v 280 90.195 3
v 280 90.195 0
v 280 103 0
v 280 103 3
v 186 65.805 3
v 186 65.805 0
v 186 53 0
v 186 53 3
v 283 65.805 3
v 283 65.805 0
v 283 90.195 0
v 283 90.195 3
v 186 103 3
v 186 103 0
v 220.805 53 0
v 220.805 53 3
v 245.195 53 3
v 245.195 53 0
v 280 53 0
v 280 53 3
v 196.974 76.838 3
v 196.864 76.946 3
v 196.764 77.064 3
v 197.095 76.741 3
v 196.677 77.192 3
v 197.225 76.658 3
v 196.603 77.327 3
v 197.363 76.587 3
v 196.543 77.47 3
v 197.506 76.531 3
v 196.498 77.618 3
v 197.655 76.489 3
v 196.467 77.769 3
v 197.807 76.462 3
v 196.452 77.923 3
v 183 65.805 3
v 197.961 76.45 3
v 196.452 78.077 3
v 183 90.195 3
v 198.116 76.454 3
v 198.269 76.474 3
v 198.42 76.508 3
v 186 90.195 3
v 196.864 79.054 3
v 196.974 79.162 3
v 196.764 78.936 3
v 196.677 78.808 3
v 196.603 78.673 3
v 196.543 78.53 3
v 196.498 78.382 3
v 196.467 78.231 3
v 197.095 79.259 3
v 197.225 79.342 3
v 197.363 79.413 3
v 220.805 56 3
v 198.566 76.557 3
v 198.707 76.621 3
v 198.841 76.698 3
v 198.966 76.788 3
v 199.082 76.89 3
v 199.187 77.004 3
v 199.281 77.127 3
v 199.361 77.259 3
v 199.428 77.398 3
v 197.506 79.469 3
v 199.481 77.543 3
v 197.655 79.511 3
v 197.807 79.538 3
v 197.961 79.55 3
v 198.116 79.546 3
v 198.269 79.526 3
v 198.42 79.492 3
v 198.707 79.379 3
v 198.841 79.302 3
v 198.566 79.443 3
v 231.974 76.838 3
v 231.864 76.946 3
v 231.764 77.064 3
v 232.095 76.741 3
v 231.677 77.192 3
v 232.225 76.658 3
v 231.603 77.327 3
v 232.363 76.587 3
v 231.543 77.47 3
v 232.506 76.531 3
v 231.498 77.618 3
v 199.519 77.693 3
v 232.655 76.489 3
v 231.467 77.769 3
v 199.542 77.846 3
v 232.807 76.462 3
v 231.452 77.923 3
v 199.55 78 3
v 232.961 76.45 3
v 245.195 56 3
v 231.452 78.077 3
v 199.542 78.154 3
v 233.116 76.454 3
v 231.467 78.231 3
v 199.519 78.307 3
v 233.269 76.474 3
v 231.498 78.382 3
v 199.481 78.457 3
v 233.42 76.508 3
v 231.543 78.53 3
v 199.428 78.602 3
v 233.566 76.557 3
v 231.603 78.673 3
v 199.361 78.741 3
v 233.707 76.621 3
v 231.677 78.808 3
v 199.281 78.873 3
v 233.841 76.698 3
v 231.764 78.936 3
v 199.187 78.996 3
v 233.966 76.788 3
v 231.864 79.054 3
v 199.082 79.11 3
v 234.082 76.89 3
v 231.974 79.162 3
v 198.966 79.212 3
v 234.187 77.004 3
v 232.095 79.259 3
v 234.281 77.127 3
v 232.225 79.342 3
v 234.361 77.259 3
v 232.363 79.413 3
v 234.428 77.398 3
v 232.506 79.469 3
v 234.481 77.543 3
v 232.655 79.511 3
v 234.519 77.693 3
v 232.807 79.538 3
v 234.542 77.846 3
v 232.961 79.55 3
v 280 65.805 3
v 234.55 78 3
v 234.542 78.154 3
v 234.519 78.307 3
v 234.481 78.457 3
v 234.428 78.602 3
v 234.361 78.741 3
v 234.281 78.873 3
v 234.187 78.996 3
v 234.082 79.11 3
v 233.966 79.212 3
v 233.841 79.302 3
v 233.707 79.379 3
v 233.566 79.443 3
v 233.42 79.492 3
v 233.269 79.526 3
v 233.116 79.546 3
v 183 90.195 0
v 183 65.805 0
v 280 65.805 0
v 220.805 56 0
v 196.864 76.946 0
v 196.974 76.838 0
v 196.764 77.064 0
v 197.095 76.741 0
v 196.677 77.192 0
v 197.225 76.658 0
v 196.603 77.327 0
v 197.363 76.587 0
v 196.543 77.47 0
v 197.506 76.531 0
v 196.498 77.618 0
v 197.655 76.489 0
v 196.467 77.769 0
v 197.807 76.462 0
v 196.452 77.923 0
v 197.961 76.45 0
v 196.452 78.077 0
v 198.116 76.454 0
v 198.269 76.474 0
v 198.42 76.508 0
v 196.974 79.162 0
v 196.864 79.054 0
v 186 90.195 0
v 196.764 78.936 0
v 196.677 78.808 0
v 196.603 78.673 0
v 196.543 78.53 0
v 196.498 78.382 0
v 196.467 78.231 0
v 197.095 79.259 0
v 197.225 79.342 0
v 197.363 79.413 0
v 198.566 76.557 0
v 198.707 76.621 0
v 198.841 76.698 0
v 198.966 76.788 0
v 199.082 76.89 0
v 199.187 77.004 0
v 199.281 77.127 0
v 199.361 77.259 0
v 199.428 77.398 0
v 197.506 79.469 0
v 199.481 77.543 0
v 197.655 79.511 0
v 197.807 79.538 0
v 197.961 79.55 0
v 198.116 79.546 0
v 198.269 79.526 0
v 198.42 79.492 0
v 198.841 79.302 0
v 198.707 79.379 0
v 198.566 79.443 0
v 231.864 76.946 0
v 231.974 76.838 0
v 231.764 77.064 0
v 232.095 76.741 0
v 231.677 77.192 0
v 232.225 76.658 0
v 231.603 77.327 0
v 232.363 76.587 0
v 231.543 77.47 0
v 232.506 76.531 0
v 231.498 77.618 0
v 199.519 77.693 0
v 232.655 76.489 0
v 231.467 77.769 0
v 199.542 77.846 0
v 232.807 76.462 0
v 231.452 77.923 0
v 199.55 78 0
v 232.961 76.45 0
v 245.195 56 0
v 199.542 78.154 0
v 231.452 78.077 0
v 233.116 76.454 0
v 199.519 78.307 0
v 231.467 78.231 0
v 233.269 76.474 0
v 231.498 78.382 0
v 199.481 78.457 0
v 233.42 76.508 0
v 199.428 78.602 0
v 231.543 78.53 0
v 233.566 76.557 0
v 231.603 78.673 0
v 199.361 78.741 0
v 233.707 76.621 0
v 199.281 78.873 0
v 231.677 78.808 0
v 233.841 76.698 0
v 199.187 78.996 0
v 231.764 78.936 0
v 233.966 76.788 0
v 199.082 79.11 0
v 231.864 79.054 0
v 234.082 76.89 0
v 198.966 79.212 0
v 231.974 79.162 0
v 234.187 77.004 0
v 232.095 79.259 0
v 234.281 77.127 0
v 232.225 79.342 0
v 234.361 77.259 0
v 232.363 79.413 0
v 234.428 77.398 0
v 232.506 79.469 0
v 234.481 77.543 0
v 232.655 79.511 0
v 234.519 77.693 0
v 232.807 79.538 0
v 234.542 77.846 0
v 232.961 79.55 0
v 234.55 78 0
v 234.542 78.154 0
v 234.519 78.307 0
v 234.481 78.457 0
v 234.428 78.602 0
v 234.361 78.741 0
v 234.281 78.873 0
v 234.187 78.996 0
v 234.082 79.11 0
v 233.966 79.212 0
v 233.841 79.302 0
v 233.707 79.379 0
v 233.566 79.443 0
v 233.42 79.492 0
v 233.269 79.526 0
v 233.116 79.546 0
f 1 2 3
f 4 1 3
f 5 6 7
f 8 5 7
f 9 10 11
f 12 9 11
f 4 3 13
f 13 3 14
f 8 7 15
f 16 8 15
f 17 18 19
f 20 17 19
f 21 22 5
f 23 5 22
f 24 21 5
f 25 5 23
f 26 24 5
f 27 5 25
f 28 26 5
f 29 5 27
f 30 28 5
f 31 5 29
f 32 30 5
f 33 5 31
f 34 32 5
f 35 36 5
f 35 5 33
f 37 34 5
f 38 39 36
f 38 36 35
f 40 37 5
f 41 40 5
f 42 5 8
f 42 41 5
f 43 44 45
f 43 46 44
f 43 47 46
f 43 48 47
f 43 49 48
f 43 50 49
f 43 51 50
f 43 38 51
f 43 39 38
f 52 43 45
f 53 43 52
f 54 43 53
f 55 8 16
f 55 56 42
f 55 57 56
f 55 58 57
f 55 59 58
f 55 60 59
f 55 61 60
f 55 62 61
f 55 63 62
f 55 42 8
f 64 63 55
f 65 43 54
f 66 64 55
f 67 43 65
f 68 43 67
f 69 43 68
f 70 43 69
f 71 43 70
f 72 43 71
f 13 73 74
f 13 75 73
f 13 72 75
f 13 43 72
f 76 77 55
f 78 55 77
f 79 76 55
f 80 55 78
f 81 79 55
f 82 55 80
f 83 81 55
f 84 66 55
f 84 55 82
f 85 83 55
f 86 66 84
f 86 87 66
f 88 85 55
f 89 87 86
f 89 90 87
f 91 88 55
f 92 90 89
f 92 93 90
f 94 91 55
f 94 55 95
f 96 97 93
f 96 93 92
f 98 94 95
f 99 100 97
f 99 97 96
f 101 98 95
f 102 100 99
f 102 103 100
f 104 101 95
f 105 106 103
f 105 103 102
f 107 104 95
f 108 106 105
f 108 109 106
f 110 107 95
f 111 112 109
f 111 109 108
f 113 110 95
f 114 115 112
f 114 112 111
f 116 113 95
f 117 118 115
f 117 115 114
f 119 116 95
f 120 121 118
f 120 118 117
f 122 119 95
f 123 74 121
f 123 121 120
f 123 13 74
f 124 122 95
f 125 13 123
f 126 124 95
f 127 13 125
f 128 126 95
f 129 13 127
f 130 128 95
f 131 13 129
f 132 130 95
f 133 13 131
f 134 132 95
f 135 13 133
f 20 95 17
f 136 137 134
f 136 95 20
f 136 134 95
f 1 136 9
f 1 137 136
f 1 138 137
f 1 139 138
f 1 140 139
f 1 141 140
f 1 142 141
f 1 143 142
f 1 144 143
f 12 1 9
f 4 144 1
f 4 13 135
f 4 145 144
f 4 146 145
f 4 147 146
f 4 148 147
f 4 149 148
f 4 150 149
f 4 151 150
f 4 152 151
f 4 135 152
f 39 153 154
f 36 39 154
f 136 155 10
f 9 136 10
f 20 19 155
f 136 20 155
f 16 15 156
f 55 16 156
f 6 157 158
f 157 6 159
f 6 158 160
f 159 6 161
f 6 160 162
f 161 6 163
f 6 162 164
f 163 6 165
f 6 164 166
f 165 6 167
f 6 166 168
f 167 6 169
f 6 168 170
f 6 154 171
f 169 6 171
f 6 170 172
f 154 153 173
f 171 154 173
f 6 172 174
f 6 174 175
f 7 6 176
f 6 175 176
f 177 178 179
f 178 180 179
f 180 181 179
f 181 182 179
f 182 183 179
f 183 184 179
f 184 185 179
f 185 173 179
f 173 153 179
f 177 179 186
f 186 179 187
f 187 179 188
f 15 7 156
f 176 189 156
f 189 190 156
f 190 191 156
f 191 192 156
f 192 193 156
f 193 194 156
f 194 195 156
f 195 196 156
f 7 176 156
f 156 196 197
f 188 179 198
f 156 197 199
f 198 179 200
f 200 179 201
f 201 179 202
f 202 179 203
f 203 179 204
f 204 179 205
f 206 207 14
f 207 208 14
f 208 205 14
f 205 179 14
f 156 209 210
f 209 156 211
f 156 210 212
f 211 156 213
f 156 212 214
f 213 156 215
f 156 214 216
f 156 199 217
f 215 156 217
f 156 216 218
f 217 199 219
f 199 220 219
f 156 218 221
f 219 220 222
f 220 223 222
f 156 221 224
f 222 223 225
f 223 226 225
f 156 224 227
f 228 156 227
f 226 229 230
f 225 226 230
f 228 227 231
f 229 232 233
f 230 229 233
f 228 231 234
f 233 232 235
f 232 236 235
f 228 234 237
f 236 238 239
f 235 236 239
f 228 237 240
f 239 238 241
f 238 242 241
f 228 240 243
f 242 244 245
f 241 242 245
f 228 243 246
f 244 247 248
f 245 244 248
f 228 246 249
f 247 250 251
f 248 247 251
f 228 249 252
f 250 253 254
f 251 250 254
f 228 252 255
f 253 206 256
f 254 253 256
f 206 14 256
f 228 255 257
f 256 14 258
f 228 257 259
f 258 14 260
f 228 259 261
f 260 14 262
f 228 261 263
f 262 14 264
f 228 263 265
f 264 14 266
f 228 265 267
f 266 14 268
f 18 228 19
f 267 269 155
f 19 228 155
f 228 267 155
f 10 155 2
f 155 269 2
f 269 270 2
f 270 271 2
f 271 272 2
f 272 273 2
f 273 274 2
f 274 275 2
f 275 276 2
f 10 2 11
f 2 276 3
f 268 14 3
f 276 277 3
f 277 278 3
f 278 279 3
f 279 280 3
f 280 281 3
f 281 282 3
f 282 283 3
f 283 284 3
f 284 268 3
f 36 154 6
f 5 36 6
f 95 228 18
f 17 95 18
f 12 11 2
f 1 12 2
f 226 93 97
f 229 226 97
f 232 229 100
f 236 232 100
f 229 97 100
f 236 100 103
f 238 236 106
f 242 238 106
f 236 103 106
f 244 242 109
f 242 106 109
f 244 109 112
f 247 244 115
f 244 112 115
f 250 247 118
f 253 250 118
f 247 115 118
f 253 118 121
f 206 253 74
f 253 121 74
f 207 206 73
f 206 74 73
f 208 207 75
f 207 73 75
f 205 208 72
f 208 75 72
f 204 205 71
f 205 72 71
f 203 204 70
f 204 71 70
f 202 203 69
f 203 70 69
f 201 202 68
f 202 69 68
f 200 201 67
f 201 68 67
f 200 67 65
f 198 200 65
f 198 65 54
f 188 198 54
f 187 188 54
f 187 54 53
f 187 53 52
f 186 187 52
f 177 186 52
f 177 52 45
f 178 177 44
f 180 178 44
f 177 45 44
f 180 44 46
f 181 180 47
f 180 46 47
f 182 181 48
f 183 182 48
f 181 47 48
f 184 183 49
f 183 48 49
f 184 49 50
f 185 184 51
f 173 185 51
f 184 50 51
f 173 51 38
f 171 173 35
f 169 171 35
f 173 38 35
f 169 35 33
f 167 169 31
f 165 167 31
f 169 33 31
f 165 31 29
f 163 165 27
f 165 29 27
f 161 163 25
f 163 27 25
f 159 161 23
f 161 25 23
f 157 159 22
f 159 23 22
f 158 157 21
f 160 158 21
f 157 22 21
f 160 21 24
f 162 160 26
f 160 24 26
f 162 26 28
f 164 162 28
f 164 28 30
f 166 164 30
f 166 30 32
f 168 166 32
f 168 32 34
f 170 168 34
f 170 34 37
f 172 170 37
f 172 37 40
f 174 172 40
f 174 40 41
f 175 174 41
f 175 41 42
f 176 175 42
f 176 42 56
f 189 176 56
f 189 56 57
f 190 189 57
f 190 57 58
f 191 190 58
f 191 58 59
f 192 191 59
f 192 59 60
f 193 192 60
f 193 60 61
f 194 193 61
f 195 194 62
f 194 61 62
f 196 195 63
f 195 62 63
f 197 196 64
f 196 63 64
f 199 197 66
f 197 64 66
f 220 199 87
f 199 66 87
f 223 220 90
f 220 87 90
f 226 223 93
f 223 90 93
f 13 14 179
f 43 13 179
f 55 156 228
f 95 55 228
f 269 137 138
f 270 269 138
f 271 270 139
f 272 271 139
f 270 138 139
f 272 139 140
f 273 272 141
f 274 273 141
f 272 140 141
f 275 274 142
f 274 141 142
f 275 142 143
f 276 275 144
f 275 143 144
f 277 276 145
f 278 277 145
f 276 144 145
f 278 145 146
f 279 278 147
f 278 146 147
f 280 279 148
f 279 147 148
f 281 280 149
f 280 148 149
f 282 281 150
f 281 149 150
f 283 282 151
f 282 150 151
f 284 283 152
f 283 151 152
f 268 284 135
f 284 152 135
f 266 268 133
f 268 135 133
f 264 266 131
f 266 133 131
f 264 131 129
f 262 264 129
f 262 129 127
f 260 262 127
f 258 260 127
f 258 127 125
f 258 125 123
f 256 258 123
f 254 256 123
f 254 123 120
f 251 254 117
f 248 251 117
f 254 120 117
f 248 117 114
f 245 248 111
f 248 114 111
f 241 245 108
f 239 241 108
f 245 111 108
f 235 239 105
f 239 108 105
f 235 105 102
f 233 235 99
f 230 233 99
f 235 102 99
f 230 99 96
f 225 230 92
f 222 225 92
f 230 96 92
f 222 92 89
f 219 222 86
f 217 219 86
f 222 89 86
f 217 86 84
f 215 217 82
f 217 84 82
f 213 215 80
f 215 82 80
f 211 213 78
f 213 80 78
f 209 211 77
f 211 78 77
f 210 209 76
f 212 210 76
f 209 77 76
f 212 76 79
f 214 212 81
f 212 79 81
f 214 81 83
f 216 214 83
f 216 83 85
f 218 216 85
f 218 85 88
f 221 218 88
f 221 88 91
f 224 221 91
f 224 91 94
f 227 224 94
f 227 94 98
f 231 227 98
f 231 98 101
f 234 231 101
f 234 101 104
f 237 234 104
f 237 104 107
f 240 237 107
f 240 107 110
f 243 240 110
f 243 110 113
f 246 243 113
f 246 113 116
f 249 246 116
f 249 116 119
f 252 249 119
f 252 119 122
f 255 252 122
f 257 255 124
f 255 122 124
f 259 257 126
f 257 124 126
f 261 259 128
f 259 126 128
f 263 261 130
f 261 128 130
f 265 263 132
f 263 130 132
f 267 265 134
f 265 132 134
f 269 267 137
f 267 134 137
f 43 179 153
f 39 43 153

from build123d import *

# Parameters (mm, degrees)
SALIENTE_EXTRUIR1_DEPTH = 3
CROQUIS2_R              = 1.55
CORTAR_EXTRUIR1_DEPTH   = 3


with BuildPart() as part:
    # Model → Saliente-Extruir1 (new body)
    with BuildSketch(Plane.XY):
        Polygon((186, 103), (186, 90.195), (183, 90.195), (183, 65.805), (186, 65.805), (186, 53), (220.805, 53), (220.805, 56), (245.195, 56), (245.195, 53), (269.585, 53), (280, 53), (280, 65.805), (283, 65.805), (283, 90.195), (280, 90.195), (280, 103), align=None)
    extrude(amount=SALIENTE_EXTRUIR1_DEPTH)

    # Croquis2 → Cortar-Extruir1 (cut)
    with BuildSketch(Plane.XY.offset(3)):
        with Locations((233, 78)):
            Circle(CROQUIS2_R)
        with Locations((198, 78)):
            Circle(CROQUIS2_R)
    extrude(amount=-CORTAR_EXTRUIR1_DEPTH, mode=Mode.SUBTRACT)


solid = part.part
